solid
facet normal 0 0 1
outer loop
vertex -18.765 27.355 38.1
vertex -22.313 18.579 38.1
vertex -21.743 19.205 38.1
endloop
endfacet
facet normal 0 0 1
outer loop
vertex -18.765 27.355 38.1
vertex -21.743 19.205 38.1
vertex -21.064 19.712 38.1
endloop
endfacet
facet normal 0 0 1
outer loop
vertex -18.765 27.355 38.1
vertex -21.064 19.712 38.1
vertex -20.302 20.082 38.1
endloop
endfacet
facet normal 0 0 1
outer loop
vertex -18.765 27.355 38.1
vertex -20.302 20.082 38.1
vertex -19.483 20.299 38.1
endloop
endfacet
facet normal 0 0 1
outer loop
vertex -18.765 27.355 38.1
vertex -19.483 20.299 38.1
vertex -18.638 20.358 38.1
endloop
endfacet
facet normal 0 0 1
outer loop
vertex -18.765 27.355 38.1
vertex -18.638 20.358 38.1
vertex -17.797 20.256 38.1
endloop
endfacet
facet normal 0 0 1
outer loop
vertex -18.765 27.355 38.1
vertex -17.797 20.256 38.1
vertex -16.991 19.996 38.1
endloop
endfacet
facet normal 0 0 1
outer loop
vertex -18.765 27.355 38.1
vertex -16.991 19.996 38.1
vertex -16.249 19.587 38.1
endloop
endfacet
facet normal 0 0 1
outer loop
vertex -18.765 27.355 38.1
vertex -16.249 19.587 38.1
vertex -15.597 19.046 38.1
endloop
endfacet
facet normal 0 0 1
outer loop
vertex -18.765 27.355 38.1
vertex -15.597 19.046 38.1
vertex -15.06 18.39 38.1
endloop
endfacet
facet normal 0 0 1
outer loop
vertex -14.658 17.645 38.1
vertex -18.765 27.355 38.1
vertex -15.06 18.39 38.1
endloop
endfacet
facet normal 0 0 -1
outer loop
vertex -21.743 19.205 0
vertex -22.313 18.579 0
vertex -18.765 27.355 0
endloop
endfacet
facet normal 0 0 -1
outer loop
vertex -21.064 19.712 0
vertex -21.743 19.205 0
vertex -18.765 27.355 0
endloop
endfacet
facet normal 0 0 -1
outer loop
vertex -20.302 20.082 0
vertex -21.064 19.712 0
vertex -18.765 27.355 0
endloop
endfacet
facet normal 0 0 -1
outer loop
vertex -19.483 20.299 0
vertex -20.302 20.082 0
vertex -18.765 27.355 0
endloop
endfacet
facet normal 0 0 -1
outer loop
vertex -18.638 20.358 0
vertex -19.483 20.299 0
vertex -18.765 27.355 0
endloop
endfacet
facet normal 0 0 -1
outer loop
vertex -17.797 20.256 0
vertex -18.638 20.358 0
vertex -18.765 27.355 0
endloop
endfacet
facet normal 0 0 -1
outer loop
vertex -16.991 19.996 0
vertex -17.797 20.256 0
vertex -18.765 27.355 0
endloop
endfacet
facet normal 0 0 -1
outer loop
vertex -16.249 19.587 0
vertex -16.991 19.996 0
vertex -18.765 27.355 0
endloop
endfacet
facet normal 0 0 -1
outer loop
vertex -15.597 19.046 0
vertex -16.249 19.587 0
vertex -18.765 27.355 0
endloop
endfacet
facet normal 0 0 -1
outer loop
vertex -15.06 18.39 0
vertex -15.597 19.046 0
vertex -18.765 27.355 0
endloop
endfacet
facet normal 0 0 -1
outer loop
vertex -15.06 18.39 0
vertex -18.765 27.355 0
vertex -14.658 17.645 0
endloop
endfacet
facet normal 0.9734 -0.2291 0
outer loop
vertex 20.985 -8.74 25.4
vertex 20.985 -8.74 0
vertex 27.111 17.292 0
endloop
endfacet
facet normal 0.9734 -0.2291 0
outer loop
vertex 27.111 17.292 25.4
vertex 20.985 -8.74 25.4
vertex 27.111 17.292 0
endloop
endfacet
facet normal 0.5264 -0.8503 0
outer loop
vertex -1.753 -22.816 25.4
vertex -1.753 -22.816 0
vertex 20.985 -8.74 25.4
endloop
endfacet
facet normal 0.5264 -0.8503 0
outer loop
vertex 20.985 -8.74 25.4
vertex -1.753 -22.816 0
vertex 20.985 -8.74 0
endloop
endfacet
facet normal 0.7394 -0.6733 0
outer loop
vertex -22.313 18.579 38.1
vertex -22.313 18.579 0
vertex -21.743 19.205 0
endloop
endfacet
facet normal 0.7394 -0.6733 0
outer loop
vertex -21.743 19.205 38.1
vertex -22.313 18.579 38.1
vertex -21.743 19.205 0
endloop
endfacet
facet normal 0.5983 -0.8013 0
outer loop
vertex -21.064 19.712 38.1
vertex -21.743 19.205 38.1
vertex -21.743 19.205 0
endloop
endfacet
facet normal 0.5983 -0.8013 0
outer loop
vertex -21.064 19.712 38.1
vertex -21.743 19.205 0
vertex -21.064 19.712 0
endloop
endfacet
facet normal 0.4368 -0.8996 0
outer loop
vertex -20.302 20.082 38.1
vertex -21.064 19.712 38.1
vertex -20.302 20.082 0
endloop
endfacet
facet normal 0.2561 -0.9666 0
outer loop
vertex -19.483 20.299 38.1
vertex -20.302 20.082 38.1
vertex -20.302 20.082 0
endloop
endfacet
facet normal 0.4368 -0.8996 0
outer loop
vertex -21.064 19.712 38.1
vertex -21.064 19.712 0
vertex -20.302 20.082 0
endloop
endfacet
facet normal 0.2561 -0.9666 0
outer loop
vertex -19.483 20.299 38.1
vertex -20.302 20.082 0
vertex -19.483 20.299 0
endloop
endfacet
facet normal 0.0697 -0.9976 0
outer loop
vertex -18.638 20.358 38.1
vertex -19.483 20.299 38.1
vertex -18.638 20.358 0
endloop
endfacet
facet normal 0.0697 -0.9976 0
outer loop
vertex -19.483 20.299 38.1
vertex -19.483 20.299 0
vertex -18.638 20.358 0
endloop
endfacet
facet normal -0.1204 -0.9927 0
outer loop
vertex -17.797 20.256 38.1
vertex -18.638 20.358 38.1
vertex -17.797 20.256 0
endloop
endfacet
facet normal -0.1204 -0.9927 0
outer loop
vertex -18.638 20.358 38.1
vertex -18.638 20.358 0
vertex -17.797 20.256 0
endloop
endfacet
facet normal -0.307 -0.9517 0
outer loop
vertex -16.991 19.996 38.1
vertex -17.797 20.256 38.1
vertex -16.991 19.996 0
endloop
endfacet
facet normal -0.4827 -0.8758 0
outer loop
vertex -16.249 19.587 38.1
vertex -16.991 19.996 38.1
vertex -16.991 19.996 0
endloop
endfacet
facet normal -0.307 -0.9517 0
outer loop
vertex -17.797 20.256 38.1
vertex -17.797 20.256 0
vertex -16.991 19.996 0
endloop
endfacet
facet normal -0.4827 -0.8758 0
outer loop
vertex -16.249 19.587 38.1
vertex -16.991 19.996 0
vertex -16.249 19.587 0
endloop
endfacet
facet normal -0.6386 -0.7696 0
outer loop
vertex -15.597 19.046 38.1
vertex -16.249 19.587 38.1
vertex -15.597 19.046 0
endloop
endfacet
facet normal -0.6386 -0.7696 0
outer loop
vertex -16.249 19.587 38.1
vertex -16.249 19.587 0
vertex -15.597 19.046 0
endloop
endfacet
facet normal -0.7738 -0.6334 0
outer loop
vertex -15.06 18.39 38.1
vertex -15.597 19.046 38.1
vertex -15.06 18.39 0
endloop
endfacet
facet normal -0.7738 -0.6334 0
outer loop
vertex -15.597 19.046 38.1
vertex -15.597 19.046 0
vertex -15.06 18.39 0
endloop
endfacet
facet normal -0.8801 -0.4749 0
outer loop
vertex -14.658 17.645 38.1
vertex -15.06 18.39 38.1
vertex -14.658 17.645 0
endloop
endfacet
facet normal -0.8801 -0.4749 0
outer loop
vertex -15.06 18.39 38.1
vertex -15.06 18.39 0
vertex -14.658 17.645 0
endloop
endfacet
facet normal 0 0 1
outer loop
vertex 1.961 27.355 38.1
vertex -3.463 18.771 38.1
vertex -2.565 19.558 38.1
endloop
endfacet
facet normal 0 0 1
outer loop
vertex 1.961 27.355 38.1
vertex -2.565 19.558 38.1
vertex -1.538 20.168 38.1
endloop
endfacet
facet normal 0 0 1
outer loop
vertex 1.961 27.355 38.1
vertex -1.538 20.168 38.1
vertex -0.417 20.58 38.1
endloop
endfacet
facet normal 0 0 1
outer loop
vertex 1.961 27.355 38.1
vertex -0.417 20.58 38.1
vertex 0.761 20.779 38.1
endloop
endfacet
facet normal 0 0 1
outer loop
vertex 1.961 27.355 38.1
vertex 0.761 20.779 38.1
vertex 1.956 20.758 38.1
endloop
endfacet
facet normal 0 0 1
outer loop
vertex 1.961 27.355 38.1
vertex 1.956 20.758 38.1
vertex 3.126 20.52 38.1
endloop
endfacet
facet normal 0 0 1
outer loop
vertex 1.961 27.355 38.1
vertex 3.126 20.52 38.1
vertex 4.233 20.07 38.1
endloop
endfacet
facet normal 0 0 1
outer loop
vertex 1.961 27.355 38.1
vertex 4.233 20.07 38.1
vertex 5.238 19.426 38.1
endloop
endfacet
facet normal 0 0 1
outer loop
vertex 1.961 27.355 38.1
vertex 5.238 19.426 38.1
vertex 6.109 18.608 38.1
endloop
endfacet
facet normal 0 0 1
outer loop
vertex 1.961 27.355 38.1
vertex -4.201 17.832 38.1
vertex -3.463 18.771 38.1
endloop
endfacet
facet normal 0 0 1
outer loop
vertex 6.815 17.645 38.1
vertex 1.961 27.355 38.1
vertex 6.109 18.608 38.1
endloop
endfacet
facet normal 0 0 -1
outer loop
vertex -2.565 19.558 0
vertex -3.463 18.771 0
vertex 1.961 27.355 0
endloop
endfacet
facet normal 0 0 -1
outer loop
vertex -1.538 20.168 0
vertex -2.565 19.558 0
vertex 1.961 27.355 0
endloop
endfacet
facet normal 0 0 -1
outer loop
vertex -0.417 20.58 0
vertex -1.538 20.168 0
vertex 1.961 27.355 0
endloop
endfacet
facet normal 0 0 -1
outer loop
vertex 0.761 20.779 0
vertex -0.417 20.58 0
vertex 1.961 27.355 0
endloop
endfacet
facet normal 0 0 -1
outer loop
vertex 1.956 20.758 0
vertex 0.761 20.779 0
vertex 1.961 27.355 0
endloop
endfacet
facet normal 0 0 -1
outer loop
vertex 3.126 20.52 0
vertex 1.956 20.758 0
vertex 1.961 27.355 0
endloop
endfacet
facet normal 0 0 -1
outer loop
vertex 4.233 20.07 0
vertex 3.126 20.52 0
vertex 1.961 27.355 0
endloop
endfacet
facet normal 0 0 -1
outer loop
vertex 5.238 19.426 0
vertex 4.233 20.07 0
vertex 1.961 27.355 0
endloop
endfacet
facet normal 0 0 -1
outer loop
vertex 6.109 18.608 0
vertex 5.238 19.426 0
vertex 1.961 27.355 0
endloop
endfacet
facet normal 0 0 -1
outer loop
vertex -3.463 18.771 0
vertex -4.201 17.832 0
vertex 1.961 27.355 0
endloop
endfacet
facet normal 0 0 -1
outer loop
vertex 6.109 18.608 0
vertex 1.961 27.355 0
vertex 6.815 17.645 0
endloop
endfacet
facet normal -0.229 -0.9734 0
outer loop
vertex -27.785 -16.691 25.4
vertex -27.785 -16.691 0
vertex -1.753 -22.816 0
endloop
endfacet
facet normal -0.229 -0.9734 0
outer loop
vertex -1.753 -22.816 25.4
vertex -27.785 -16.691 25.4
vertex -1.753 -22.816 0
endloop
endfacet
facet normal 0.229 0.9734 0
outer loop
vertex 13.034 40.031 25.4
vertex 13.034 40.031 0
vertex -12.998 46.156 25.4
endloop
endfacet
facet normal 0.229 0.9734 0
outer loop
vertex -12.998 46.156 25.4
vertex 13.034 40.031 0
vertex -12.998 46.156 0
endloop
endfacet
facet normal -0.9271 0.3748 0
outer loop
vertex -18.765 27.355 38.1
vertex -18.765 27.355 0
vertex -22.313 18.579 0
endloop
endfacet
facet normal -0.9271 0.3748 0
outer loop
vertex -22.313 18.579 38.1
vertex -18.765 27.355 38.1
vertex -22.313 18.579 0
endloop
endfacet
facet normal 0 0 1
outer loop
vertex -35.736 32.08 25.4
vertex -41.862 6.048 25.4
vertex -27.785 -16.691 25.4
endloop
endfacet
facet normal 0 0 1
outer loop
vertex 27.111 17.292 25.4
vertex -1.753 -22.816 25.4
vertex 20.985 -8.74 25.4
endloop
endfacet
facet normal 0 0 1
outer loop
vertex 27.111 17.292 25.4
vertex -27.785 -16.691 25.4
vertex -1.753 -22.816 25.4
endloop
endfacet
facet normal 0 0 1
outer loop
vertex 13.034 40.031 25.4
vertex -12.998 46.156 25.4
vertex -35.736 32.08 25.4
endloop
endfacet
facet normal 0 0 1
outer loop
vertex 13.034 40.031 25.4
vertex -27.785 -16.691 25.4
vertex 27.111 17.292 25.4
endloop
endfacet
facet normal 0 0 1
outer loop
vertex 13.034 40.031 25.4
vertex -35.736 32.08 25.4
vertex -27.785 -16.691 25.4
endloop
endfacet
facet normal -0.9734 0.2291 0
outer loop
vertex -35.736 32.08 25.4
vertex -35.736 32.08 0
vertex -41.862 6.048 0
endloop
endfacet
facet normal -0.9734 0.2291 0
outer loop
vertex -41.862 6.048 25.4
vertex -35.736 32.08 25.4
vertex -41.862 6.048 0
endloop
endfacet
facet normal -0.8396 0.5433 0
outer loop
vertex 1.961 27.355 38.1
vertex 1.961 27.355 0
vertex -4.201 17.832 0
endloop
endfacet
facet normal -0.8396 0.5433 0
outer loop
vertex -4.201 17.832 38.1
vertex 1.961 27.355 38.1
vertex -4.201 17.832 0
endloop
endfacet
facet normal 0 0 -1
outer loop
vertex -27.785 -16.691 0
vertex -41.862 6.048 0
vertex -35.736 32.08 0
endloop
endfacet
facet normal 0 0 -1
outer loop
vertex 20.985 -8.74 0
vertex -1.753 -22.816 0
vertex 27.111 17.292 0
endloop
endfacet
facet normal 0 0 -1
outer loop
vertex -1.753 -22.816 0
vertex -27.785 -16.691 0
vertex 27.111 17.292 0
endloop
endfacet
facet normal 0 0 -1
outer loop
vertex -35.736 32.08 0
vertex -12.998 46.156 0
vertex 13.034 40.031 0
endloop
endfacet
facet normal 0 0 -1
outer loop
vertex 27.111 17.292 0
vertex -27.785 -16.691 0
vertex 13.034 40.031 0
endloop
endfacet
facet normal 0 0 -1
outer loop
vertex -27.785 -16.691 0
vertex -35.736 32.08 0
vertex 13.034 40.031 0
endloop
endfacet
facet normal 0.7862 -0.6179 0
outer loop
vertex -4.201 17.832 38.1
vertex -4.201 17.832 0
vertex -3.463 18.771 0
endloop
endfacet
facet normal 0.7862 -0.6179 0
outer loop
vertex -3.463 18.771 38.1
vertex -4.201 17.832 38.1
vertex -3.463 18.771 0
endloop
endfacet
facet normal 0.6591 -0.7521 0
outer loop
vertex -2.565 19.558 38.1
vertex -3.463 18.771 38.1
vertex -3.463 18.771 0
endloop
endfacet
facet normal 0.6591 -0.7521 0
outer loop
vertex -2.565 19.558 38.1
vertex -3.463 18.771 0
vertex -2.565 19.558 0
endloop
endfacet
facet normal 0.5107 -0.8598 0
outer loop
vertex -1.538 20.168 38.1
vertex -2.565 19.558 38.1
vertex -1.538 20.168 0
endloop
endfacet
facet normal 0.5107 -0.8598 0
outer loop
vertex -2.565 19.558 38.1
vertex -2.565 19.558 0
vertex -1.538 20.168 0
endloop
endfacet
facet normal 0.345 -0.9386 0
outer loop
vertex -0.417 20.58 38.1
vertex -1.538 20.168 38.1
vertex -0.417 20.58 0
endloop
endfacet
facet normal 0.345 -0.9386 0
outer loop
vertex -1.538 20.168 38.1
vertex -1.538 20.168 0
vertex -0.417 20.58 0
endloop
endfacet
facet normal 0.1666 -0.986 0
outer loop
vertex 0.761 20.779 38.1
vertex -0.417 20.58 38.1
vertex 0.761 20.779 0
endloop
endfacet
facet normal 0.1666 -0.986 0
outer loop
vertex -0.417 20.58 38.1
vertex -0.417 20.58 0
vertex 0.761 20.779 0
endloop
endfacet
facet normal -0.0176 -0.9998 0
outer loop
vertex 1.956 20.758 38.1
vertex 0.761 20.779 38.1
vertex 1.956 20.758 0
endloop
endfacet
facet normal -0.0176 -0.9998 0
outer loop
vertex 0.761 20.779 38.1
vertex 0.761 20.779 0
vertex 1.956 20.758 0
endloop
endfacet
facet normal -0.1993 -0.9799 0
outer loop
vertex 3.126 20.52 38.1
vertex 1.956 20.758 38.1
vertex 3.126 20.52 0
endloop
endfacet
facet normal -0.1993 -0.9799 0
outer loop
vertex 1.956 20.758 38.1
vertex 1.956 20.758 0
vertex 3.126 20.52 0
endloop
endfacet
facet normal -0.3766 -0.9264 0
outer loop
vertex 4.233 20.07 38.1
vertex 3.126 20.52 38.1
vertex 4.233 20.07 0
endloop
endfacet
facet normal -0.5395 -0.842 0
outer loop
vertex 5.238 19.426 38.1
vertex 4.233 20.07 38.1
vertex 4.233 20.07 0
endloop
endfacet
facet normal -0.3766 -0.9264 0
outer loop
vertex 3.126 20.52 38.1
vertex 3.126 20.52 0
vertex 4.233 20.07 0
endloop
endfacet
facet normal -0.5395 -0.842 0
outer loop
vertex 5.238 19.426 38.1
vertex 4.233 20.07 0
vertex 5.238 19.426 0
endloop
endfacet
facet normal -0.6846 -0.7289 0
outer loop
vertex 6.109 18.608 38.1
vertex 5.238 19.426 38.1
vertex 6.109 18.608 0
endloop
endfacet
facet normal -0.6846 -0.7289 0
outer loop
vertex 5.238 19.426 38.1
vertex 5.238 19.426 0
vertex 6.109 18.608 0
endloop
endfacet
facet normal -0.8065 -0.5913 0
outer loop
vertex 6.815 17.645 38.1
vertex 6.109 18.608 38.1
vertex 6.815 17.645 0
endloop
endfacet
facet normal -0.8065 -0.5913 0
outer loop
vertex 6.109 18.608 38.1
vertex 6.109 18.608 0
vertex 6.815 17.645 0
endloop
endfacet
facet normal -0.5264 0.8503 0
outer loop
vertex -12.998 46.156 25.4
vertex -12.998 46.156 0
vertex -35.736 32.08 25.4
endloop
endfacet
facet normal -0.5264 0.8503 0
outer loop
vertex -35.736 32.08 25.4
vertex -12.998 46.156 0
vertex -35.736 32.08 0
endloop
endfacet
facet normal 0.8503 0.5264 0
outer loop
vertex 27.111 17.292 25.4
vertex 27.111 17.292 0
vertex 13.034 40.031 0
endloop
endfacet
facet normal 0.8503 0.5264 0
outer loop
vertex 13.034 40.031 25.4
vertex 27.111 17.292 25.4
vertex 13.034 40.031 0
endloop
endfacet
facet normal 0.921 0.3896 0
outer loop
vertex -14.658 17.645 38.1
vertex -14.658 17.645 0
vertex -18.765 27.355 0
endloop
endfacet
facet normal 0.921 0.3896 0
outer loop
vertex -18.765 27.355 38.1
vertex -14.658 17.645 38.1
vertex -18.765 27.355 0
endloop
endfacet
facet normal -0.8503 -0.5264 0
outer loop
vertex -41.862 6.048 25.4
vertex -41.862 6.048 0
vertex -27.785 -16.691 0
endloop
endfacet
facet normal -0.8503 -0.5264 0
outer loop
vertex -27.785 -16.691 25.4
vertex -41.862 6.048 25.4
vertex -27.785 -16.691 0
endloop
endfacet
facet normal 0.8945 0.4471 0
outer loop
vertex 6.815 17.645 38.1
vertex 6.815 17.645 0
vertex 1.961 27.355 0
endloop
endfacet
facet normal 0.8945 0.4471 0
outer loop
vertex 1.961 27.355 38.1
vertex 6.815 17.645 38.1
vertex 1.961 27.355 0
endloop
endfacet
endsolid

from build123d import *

# Parameters (mm, degrees)
F2_DEPTH = 38.1
F3_DEPTH = 25.4


with BuildPart() as f2:
    # F1 (on Top) → F2 (new body)
    with BuildSketch(Plane.XY):
        with BuildLine():
            Line((-18.765474, 27.354643), (-22.313174, 18.578751))
            ThreePointArc((-22.313174, 18.578751), (-18.215258, 20.327041), (-14.657608, 17.645145))
            Line((-14.657608, 17.645145), (-18.765474, 27.354643))
        make_face()
        with BuildLine():
            Line((1.96057, 27.354643), (-4.201226, 17.831868))
            ThreePointArc((-4.201226, 17.831868), (1.358869, 20.795927), (6.815321, 17.645145))
            Line((6.815321, 17.645145), (1.96057, 27.354643))
        make_face()
    extrude(amount=F2_DEPTH)


with BuildPart() as f3:
    # F0 (on Top) → F3 (new body)
    with BuildSketch(Plane.XY):
        Polygon((-1.753196, -22.816095), (20.985475, -8.739774), (27.110681, 17.292357), (13.034359, 40.031029), (-12.997772, 46.156235), (-35.736443, 32.079913), (-41.861649, 6.047782), (-27.785327, -16.690889), align=None)
    extrude(amount=F3_DEPTH)


solid = Compound([f2.part, f3.part])
